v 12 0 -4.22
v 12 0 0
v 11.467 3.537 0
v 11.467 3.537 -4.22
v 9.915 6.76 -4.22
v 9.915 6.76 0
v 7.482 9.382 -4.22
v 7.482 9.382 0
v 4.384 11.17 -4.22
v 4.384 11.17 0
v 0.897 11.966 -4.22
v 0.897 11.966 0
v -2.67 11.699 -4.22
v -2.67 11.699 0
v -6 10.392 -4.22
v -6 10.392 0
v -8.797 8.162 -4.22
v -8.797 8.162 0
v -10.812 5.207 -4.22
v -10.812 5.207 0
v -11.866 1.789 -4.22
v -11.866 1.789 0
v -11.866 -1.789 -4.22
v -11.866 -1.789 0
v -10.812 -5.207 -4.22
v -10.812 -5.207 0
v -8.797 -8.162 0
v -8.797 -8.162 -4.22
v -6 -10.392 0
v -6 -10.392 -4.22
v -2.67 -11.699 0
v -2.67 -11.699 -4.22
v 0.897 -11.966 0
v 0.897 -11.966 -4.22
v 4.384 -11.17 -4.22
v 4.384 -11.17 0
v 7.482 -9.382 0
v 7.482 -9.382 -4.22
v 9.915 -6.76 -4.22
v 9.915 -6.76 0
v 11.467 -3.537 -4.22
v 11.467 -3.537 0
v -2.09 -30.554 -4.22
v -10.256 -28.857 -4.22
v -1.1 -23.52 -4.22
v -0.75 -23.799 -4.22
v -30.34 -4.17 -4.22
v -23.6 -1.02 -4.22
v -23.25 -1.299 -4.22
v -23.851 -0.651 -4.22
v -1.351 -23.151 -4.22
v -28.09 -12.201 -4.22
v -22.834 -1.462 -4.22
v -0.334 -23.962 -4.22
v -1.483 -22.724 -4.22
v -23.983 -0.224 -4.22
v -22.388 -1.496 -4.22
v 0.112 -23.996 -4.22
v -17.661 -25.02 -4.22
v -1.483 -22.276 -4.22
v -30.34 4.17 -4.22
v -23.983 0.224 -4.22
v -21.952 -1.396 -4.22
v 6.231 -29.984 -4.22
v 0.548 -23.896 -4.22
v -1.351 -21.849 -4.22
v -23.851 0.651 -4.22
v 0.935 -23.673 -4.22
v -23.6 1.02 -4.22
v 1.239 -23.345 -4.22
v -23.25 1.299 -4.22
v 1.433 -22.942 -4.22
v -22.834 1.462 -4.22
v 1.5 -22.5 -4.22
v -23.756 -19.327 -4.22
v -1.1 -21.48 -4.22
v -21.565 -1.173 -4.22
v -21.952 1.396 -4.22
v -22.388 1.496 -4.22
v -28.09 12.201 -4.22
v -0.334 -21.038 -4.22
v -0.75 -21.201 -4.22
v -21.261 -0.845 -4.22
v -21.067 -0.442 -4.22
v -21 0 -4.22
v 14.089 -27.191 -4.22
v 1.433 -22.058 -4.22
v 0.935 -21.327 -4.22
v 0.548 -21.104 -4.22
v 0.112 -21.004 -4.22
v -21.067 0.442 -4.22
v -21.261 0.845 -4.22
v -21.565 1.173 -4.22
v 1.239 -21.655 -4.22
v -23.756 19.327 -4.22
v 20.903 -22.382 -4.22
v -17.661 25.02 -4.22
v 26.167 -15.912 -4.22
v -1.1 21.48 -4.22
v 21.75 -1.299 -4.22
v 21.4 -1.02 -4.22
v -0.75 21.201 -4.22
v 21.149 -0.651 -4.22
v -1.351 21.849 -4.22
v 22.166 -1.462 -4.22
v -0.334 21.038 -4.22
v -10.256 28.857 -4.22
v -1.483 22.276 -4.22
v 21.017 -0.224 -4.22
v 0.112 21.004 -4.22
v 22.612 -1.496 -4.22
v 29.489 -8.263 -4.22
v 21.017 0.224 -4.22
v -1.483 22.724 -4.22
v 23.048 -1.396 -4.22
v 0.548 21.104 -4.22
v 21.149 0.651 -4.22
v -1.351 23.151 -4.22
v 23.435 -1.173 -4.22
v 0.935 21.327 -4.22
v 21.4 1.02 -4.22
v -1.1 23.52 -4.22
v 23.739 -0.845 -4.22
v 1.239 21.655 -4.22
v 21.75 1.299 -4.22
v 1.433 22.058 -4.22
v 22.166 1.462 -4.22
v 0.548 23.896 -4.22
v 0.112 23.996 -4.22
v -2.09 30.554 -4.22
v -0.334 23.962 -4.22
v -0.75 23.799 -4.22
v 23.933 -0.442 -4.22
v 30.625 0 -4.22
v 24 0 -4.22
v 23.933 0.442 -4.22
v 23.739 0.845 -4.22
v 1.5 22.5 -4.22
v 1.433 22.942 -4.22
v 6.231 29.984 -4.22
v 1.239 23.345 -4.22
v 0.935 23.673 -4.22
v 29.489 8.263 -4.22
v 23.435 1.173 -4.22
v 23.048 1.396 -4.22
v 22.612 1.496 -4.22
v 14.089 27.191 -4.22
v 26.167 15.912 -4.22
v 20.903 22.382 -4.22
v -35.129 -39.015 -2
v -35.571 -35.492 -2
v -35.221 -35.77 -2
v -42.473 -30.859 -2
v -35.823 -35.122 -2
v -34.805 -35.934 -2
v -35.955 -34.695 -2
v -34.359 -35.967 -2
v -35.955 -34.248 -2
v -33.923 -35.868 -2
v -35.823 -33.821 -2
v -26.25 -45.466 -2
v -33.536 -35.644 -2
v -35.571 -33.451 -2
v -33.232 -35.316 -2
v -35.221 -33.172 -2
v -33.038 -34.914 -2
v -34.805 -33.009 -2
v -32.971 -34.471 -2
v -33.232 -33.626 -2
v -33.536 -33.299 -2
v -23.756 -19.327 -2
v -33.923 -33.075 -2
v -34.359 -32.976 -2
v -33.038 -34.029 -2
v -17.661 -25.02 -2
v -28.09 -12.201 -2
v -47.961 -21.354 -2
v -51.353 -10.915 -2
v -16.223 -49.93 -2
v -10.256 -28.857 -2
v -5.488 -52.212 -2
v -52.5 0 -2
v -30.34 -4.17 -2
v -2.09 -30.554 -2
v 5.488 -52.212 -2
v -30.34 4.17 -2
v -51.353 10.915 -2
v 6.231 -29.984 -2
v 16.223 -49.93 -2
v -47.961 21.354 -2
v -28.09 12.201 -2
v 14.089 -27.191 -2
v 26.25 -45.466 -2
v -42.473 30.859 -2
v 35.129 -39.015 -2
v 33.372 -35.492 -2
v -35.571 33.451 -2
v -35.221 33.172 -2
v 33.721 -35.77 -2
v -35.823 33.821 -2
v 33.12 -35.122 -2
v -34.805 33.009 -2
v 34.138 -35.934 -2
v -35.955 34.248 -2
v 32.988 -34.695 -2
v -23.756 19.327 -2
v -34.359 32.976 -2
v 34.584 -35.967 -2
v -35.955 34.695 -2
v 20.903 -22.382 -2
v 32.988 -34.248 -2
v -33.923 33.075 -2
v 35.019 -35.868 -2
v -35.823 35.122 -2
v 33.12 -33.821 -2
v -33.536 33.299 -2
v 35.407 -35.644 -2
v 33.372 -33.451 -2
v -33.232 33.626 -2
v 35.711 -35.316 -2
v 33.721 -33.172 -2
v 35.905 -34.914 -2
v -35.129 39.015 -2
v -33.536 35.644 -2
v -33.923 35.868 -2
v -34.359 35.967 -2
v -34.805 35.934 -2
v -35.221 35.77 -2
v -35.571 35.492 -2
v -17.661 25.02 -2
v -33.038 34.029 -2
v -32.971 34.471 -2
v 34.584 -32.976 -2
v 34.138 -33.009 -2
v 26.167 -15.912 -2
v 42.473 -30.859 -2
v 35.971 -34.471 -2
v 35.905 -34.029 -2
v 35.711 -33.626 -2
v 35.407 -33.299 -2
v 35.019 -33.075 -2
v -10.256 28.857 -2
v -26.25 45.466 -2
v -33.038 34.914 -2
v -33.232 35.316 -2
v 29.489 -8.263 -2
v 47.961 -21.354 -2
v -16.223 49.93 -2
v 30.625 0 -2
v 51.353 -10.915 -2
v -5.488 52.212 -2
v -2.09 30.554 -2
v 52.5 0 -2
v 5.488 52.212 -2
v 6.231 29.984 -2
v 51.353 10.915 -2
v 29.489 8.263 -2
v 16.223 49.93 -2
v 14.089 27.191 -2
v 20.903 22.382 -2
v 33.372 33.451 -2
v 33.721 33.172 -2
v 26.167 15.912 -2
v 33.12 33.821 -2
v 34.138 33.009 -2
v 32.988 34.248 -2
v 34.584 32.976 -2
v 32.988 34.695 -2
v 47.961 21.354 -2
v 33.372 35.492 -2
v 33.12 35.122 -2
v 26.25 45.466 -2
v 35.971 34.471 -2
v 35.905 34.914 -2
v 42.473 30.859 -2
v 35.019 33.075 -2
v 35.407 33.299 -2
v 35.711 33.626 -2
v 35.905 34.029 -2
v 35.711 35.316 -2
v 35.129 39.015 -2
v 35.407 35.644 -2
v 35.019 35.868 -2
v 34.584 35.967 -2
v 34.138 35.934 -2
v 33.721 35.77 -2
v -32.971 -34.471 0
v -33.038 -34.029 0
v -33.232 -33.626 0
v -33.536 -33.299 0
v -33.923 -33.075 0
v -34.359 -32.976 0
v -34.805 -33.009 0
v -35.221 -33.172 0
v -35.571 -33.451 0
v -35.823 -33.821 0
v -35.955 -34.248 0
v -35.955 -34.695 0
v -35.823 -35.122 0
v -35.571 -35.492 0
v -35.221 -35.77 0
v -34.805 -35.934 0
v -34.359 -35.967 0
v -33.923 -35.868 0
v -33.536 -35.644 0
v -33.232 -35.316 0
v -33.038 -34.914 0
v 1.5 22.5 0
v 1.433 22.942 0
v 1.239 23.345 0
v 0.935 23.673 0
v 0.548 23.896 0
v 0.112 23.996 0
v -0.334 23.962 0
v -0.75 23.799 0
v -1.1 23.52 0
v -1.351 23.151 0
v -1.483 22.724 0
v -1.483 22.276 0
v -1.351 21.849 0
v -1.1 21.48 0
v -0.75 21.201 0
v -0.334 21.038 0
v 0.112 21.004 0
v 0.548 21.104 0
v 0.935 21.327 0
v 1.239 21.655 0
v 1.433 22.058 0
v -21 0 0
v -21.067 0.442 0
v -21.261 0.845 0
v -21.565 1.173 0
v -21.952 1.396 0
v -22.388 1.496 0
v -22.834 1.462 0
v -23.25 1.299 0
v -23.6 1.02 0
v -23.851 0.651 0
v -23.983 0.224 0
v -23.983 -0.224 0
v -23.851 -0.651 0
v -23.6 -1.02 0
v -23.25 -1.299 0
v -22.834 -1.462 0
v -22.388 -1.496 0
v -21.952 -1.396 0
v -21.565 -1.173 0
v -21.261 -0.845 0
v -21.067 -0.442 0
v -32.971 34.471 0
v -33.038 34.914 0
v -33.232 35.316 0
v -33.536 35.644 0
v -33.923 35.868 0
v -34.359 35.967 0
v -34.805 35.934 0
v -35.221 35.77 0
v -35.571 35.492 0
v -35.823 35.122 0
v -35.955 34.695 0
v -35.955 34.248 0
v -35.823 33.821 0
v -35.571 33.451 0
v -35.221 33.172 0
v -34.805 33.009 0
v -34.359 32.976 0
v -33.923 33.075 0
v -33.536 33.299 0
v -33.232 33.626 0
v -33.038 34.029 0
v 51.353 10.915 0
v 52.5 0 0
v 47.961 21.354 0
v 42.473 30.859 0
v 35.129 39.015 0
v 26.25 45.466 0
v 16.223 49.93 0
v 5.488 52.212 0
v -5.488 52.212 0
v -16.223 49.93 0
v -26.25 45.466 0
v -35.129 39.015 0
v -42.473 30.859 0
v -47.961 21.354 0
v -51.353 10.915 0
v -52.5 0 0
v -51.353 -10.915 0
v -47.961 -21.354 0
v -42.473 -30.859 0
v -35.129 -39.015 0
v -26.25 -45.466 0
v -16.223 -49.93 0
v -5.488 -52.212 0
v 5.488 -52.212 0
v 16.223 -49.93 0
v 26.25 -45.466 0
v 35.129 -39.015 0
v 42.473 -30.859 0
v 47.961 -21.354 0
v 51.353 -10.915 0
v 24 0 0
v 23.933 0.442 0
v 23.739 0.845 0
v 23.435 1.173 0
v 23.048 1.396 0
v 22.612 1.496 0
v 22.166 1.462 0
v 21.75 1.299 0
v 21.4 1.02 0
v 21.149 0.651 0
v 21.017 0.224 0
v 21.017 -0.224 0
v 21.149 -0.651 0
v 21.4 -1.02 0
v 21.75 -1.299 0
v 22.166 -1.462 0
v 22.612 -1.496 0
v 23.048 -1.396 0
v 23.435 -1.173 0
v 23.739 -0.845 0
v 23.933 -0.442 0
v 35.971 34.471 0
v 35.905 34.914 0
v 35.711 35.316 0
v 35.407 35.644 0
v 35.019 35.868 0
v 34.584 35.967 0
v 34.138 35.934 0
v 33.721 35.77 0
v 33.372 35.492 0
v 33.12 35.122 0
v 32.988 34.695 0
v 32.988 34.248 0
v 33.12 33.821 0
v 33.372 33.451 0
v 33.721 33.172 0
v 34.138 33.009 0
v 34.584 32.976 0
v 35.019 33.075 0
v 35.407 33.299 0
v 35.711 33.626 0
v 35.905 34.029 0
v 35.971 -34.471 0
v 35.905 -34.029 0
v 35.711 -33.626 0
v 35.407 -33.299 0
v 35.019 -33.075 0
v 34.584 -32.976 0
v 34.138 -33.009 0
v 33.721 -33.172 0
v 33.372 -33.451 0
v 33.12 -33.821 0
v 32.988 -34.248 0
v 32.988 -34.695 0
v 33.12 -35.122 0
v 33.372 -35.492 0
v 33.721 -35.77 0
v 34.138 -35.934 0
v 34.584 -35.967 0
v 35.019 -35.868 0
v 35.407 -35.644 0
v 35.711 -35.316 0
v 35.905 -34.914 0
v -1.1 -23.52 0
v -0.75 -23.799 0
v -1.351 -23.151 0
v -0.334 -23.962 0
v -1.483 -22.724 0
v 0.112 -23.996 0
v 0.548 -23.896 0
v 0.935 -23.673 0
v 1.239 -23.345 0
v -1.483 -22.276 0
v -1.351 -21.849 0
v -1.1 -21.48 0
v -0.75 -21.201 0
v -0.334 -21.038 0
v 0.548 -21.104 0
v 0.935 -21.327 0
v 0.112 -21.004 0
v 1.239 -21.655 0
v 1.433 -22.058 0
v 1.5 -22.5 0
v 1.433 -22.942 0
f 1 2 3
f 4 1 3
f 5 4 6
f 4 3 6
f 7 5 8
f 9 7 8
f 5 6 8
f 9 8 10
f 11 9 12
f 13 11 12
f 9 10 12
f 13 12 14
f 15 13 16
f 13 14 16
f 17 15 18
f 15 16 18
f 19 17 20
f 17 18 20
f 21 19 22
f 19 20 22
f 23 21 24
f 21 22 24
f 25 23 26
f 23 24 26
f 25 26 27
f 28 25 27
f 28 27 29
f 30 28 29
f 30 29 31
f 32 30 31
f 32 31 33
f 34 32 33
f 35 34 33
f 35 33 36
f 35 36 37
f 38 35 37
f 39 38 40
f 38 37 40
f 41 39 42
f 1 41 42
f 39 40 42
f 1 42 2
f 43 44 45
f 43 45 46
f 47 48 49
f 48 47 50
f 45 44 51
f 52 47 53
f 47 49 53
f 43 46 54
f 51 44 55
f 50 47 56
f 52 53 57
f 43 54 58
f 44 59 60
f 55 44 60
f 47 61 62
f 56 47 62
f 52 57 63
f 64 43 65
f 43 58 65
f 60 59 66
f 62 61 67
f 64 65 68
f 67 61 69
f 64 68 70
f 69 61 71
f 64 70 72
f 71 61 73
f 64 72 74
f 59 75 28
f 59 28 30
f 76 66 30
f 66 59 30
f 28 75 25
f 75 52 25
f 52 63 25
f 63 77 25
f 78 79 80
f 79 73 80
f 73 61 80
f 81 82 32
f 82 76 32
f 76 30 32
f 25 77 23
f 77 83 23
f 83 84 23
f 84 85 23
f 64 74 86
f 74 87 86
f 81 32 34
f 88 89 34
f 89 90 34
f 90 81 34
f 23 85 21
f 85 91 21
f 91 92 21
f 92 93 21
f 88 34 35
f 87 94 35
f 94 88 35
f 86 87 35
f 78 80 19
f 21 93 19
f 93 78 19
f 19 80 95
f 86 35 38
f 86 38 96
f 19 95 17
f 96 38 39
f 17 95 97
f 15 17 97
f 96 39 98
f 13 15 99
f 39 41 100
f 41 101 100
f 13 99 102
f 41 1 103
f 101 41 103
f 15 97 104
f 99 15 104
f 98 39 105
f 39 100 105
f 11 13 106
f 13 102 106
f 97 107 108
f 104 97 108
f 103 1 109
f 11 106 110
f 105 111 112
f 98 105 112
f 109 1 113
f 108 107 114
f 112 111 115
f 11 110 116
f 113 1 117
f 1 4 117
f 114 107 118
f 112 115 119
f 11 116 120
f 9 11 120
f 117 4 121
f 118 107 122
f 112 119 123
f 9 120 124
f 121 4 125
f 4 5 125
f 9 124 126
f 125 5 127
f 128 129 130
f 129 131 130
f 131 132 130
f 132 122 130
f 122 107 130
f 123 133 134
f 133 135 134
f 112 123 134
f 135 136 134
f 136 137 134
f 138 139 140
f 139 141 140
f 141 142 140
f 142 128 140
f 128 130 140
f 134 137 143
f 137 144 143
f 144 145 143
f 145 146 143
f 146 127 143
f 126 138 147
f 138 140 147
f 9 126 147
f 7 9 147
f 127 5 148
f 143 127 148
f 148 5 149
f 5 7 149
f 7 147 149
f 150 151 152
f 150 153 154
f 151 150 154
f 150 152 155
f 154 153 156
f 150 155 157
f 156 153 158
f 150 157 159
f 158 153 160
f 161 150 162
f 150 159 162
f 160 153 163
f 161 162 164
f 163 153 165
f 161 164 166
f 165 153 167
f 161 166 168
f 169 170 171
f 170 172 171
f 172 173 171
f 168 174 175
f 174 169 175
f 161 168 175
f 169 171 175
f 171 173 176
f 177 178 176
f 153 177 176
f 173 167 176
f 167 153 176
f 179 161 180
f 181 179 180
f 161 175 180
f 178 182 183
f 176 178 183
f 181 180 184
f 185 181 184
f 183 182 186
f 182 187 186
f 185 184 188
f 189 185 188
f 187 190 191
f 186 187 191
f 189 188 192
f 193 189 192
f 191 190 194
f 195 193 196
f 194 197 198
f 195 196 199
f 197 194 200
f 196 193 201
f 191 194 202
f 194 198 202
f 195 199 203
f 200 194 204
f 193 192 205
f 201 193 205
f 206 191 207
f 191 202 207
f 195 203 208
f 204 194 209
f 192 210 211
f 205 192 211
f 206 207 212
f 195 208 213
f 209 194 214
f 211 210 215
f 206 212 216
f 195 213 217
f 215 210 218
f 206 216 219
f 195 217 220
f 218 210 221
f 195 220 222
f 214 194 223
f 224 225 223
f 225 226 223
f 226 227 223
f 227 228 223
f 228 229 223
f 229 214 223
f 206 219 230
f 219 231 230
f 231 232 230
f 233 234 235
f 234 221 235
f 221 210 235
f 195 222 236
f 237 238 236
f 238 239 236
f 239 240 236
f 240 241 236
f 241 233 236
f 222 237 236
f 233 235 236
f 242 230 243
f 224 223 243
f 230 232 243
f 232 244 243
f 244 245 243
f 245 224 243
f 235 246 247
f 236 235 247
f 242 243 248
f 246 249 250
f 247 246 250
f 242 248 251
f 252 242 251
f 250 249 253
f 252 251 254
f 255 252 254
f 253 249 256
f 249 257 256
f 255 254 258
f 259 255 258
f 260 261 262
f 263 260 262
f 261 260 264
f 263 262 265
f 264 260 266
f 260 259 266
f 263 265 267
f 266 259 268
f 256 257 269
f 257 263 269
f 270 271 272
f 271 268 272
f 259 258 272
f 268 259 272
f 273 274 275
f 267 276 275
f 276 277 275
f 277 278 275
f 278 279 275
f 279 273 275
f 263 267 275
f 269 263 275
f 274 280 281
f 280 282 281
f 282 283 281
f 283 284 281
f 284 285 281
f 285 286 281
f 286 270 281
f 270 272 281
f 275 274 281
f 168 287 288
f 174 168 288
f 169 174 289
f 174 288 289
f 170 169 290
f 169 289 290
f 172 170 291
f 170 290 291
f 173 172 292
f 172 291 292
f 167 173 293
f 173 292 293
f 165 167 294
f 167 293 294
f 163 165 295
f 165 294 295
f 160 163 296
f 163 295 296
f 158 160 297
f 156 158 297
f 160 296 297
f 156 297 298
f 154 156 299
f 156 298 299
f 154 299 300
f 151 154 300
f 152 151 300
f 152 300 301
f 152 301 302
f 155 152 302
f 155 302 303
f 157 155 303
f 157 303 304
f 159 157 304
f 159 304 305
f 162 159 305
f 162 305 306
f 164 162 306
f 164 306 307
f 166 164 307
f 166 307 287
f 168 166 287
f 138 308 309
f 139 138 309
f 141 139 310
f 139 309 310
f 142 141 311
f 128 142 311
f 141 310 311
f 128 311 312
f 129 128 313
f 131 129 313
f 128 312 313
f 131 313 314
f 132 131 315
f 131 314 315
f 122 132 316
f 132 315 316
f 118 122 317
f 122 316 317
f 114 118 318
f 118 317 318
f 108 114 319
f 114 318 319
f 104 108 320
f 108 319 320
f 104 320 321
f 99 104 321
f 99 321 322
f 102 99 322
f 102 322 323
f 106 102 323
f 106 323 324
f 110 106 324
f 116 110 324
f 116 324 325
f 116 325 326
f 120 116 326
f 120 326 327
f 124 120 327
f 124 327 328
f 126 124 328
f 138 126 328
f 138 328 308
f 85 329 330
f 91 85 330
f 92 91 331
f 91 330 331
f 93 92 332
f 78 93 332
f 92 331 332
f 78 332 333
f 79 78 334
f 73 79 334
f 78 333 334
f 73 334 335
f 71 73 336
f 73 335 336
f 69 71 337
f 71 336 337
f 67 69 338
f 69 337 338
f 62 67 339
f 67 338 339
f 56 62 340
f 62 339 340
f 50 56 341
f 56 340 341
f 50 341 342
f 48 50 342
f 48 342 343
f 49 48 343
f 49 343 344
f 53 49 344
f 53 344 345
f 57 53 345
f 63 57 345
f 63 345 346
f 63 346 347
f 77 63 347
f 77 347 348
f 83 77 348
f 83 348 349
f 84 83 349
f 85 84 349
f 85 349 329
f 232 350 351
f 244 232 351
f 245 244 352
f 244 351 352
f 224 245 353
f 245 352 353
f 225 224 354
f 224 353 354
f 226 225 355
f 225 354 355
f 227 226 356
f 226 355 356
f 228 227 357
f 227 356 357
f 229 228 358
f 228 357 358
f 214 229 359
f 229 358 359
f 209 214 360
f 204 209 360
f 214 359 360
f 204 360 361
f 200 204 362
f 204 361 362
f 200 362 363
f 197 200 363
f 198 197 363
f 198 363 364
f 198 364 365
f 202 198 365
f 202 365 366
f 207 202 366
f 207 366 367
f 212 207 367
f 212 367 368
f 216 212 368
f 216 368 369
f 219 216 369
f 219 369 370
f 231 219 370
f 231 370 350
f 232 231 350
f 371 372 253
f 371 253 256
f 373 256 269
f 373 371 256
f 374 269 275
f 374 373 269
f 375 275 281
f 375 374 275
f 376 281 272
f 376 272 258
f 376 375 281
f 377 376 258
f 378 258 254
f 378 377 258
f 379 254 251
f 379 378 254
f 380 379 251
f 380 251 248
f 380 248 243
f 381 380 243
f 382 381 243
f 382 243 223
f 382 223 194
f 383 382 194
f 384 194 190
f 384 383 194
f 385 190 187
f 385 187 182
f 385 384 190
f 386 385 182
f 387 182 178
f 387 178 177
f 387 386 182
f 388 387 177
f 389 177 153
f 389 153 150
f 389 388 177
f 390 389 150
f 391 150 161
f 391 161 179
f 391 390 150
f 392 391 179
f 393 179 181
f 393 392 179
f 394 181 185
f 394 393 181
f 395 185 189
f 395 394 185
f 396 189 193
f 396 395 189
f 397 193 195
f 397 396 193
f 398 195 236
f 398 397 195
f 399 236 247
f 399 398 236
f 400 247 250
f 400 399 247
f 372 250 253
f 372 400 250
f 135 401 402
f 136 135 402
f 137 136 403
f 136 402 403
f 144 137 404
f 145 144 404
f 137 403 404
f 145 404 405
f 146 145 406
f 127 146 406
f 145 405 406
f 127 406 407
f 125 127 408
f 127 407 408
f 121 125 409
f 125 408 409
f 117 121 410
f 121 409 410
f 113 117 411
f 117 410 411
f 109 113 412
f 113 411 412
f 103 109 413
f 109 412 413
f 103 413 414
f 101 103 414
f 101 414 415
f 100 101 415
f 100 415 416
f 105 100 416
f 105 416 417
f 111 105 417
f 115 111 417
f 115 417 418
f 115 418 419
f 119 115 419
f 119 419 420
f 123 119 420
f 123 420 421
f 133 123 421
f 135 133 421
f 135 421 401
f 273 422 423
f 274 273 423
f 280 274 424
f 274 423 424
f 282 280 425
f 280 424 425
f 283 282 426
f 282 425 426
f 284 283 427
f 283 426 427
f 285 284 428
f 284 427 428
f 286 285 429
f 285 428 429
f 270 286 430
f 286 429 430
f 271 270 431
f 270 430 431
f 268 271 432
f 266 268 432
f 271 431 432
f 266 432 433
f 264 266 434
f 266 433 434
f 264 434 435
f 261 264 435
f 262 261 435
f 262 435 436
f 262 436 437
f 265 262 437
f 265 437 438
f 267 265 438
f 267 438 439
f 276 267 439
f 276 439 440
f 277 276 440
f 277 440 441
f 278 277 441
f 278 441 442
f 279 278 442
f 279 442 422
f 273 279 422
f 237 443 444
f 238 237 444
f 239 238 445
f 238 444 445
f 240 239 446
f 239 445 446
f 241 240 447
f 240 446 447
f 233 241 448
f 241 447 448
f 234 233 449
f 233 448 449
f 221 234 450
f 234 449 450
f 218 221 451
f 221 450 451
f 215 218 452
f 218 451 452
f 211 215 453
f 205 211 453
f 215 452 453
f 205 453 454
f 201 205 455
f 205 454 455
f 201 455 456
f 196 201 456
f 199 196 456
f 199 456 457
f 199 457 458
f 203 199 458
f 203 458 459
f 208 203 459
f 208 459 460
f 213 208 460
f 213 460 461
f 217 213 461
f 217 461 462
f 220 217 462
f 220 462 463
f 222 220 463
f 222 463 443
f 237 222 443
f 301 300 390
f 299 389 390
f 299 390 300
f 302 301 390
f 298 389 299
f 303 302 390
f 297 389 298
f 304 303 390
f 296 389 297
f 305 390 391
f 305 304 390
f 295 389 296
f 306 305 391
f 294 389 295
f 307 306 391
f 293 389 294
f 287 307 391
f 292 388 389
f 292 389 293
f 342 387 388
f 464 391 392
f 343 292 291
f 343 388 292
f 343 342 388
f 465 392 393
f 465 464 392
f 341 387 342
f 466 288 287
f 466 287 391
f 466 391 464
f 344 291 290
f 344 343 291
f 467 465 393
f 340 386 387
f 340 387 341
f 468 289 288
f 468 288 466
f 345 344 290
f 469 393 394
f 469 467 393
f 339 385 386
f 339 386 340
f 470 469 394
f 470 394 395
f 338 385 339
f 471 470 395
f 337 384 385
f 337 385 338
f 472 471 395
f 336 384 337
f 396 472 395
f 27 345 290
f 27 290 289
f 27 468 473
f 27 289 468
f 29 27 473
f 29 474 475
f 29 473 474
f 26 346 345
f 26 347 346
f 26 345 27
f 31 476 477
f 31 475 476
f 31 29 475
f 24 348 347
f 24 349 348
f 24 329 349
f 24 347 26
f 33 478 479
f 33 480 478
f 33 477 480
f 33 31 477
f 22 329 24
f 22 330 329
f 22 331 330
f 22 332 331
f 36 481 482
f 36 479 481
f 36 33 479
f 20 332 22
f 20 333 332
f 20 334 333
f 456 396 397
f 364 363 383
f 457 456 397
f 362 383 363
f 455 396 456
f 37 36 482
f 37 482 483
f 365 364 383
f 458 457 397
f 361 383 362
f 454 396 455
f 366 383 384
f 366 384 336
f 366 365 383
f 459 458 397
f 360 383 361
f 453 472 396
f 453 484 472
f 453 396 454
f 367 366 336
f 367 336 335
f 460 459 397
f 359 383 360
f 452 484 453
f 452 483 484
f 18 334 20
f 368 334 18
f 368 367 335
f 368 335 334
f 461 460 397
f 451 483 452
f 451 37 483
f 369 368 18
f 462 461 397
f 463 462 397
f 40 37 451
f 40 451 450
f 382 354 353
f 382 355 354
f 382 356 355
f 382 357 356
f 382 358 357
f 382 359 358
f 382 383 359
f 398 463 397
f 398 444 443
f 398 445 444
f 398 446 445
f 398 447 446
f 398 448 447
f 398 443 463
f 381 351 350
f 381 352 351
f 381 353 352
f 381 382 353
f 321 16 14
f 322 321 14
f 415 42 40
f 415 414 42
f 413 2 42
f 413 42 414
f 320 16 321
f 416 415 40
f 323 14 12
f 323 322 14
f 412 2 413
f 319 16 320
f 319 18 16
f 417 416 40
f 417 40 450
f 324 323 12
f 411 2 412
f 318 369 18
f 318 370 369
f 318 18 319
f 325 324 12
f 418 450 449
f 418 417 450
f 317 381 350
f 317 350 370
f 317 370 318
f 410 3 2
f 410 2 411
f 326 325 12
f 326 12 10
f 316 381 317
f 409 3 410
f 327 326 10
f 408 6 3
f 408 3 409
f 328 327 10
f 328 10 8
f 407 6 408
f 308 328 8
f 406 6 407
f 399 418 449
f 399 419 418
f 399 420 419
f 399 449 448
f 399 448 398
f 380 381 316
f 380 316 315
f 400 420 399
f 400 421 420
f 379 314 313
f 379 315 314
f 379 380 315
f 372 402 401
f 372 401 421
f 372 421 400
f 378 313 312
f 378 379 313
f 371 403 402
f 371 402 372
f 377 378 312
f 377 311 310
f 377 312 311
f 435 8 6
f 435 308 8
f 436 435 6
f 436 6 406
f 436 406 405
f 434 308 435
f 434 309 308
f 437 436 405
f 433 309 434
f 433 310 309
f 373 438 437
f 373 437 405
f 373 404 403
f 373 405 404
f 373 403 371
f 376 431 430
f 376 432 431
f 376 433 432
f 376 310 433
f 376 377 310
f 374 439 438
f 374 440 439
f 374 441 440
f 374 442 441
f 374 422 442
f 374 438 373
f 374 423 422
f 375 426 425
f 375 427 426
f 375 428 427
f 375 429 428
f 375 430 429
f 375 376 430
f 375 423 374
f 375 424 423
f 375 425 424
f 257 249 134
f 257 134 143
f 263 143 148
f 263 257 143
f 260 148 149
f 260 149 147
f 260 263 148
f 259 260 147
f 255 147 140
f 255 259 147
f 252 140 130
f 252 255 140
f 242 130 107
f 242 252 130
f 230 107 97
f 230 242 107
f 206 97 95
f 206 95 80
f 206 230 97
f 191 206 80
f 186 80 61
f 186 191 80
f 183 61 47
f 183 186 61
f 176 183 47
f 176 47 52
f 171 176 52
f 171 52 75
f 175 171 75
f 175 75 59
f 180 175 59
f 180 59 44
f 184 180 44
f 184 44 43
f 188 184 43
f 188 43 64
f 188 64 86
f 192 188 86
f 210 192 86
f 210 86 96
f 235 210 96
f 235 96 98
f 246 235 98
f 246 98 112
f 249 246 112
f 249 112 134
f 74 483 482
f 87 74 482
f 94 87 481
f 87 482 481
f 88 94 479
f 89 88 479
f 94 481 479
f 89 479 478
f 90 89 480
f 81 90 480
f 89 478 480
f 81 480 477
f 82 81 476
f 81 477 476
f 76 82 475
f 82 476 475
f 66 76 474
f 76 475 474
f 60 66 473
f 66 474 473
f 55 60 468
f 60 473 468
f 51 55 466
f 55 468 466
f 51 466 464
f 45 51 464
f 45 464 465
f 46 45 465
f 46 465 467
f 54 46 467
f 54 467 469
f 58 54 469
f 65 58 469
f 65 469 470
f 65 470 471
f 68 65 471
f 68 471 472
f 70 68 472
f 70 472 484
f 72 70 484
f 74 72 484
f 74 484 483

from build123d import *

# Parameters (mm, degrees)
SKETCH1_R           = 30.625
SKETCH1_R_2         = 12
BOSS_EXTRUDE1_DEPTH = 4.22
SKETCH1_4_R         = 52.5
SKETCH1_4_R_2       = 30.625
BOSS_EXTRUDE2_DEPTH = 2
SKETCH2_R           = 1.5
CUT_EXTRUDE1_DEPTH  = 20


with BuildPart() as part:
    # Sketch1 → Boss-Extrude1 (new body)
    with BuildSketch(Plane.XY):
        Circle(SKETCH1_R)
        Circle(SKETCH1_R_2, mode=Mode.SUBTRACT)
    extrude(amount=-BOSS_EXTRUDE1_DEPTH)

    # Sketch1<4> → Boss-Extrude2 (add)
    with BuildSketch(Plane.XY):
        Circle(SKETCH1_4_R)
        Circle(SKETCH1_4_R_2, mode=Mode.SUBTRACT)
    extrude(amount=-BOSS_EXTRUDE2_DEPTH)

    # Sketch2 → Cut-Extrude1 (cut)
    with BuildSketch(Plane.XY):
        with Locations((-34.471455583, 34.471455583)):
            Circle(SKETCH2_R)
        with Locations((34.471455583, 34.471455583)):
            Circle(SKETCH2_R)
        with Locations((34.471455583, -34.471455583)):
            Circle(SKETCH2_R)
        with Locations((-34.471455583, -34.471455583)):
            Circle(SKETCH2_R)
        with Locations((0, 22.5)):
            Circle(SKETCH2_R)
        with Locations((22.5, 0)):
            Circle(SKETCH2_R)
        with Locations((0, -22.5)):
            Circle(SKETCH2_R)
        with Locations((-22.5, 0)):
            Circle(SKETCH2_R)
    extrude(amount=-CUT_EXTRUDE1_DEPTH, mode=Mode.SUBTRACT)


solid = part.part
